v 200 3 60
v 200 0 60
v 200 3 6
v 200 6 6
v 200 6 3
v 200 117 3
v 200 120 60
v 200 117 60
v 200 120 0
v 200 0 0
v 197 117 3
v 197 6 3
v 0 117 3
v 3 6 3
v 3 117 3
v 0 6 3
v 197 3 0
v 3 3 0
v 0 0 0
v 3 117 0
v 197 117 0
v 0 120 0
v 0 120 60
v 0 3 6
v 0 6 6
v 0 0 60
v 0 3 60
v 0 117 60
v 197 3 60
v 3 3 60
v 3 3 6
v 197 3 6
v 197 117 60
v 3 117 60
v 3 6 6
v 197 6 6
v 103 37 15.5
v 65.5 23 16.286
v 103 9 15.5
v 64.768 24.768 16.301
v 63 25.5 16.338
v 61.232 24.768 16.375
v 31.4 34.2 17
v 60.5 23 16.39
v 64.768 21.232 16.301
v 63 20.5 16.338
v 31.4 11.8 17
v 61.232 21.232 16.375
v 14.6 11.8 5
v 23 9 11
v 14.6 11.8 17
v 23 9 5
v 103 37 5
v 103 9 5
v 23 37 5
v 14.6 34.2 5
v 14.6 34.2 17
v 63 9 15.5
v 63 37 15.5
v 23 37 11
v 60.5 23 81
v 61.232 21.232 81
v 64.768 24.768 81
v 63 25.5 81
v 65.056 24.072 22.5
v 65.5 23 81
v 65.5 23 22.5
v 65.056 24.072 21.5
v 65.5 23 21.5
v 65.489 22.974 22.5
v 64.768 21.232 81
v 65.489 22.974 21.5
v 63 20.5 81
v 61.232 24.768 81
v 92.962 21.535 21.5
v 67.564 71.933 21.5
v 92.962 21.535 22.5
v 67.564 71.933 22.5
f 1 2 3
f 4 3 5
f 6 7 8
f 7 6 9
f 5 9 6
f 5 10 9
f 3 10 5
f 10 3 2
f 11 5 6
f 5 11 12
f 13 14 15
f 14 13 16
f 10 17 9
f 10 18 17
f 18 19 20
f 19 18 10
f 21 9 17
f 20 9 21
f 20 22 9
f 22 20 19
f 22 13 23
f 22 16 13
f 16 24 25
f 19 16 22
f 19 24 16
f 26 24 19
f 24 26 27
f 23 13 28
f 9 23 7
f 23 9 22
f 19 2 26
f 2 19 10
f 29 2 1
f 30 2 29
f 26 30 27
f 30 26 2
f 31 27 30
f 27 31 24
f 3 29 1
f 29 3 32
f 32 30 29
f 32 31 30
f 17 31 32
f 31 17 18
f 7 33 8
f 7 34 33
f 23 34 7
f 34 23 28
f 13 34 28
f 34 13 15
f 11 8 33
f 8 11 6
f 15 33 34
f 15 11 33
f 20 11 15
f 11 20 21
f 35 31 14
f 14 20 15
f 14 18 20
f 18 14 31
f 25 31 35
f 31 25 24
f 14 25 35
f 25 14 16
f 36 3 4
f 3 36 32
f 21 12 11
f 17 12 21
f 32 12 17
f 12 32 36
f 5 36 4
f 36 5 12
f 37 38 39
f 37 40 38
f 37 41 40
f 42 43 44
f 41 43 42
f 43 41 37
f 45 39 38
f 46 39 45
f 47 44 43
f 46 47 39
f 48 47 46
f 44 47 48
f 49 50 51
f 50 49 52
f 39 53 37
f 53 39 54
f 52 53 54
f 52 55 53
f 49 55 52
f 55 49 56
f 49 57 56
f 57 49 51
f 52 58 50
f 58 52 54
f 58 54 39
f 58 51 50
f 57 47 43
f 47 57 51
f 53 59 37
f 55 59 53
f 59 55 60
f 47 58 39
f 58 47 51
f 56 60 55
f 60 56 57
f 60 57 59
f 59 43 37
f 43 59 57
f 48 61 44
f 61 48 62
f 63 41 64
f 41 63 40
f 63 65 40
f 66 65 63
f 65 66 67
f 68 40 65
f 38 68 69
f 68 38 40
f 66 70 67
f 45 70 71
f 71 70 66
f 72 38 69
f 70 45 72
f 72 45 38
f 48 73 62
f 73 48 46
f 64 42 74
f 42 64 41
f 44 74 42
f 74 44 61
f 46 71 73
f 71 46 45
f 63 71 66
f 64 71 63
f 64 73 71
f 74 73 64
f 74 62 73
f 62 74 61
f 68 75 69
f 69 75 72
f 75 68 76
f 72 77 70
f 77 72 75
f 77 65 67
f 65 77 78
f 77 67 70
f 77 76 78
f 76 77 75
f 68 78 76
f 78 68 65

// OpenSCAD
// Låda med båt
box_length = 200;       // [100:5:300]
box_width = 120;        // [60:5:200]
box_height = 60;        // [30:2:100]
wall_thickness = 3;     // [2:0.5:6]
box_color = "SaddleBrown";

// Båt-parametrar
boat_length = 80;        // [40:2:120]
boat_width = 28;         // [15:1:50]
boat_height = 15;        // [8:1:30]
mast_height = 70;        // [30:2:120]
sail_color = "LightGray";
hull_color = "IndianRed";

// Låda (öppen åt upp)
difference() {
    color(box_color)
    union() {
        // Botten
        cube([box_length, box_width, wall_thickness]);
        // Framsidan
        translate([0, 0, wall_thickness])
            cube([box_length, wall_thickness, box_height - wall_thickness]);
        // Baksidan
        translate([0, box_width - wall_thickness, wall_thickness])
            cube([box_length, wall_thickness, box_height - wall_thickness]);
        // Vänster sida
        translate([0, wall_thickness, wall_thickness])
            cube(wall_thickness, box_width - 2 * wall_thickness, box_height - wall_thickness);
        // Höger sida
        translate([box_length - wall_thickness, wall_thickness, wall_thickness])
            cube(wall_thickness, box_width - 2 * wall_thickness, box_height - wall_thickness);
    }
    // Inre utrymme
    translate([wall_thickness, wall_thickness, 0])
        cube([box_length - 2 * wall_thickness, box_width - 2 * wall_thickness, box_height]);
}

// Båt
translate([(box_length - boat_length) / 2 + wall_thickness, 
           (box_width - boat_length) / 2 + wall_thickness,
           wall_thickness + 2])
union() {
    // Skroppsdel
    color(hull_color)
    hull() {
        // Botten (plattare del)
        translate([-boat_length / 2, -boat_width / 2, 0])
            cube([boat_length, boat_width, boat_height * 0.4]);
        // Förstäv (spetsig fram)
        translate([-boat_length / 2 - boat_width * 0.3, -boat_width / 2 + boat_width * 0.1, 0])
            cube([boat_width * 0.6, boat_width * 0.8, boat_height * 0.8]);
        // Aktern (bredare bak)
        translate([-boat_length / 2 + boat_length * 0.5, -boat_width / 2, boat_height * 0.1])
            cube([boat_length * 0.5, boat_width, boat_height * 0.6]);
    }
    // Mast
    color("DarkSlateGray")
    translate([0, 0, boat_height * 0.4])
    cylinder(h = mast_height, r = 2.5, center = false);
    // Segel
    color(sail_color)
    translate([2, 0, boat_height * 0.4 + mast_height * 0.15])
    rotate([0, 0, -3])
    linear_extrude(height = 1)
    polygon(points = [[0, 0], [0, mast_height * 0.7], [boat_length * 0.35, 0]]);
}
